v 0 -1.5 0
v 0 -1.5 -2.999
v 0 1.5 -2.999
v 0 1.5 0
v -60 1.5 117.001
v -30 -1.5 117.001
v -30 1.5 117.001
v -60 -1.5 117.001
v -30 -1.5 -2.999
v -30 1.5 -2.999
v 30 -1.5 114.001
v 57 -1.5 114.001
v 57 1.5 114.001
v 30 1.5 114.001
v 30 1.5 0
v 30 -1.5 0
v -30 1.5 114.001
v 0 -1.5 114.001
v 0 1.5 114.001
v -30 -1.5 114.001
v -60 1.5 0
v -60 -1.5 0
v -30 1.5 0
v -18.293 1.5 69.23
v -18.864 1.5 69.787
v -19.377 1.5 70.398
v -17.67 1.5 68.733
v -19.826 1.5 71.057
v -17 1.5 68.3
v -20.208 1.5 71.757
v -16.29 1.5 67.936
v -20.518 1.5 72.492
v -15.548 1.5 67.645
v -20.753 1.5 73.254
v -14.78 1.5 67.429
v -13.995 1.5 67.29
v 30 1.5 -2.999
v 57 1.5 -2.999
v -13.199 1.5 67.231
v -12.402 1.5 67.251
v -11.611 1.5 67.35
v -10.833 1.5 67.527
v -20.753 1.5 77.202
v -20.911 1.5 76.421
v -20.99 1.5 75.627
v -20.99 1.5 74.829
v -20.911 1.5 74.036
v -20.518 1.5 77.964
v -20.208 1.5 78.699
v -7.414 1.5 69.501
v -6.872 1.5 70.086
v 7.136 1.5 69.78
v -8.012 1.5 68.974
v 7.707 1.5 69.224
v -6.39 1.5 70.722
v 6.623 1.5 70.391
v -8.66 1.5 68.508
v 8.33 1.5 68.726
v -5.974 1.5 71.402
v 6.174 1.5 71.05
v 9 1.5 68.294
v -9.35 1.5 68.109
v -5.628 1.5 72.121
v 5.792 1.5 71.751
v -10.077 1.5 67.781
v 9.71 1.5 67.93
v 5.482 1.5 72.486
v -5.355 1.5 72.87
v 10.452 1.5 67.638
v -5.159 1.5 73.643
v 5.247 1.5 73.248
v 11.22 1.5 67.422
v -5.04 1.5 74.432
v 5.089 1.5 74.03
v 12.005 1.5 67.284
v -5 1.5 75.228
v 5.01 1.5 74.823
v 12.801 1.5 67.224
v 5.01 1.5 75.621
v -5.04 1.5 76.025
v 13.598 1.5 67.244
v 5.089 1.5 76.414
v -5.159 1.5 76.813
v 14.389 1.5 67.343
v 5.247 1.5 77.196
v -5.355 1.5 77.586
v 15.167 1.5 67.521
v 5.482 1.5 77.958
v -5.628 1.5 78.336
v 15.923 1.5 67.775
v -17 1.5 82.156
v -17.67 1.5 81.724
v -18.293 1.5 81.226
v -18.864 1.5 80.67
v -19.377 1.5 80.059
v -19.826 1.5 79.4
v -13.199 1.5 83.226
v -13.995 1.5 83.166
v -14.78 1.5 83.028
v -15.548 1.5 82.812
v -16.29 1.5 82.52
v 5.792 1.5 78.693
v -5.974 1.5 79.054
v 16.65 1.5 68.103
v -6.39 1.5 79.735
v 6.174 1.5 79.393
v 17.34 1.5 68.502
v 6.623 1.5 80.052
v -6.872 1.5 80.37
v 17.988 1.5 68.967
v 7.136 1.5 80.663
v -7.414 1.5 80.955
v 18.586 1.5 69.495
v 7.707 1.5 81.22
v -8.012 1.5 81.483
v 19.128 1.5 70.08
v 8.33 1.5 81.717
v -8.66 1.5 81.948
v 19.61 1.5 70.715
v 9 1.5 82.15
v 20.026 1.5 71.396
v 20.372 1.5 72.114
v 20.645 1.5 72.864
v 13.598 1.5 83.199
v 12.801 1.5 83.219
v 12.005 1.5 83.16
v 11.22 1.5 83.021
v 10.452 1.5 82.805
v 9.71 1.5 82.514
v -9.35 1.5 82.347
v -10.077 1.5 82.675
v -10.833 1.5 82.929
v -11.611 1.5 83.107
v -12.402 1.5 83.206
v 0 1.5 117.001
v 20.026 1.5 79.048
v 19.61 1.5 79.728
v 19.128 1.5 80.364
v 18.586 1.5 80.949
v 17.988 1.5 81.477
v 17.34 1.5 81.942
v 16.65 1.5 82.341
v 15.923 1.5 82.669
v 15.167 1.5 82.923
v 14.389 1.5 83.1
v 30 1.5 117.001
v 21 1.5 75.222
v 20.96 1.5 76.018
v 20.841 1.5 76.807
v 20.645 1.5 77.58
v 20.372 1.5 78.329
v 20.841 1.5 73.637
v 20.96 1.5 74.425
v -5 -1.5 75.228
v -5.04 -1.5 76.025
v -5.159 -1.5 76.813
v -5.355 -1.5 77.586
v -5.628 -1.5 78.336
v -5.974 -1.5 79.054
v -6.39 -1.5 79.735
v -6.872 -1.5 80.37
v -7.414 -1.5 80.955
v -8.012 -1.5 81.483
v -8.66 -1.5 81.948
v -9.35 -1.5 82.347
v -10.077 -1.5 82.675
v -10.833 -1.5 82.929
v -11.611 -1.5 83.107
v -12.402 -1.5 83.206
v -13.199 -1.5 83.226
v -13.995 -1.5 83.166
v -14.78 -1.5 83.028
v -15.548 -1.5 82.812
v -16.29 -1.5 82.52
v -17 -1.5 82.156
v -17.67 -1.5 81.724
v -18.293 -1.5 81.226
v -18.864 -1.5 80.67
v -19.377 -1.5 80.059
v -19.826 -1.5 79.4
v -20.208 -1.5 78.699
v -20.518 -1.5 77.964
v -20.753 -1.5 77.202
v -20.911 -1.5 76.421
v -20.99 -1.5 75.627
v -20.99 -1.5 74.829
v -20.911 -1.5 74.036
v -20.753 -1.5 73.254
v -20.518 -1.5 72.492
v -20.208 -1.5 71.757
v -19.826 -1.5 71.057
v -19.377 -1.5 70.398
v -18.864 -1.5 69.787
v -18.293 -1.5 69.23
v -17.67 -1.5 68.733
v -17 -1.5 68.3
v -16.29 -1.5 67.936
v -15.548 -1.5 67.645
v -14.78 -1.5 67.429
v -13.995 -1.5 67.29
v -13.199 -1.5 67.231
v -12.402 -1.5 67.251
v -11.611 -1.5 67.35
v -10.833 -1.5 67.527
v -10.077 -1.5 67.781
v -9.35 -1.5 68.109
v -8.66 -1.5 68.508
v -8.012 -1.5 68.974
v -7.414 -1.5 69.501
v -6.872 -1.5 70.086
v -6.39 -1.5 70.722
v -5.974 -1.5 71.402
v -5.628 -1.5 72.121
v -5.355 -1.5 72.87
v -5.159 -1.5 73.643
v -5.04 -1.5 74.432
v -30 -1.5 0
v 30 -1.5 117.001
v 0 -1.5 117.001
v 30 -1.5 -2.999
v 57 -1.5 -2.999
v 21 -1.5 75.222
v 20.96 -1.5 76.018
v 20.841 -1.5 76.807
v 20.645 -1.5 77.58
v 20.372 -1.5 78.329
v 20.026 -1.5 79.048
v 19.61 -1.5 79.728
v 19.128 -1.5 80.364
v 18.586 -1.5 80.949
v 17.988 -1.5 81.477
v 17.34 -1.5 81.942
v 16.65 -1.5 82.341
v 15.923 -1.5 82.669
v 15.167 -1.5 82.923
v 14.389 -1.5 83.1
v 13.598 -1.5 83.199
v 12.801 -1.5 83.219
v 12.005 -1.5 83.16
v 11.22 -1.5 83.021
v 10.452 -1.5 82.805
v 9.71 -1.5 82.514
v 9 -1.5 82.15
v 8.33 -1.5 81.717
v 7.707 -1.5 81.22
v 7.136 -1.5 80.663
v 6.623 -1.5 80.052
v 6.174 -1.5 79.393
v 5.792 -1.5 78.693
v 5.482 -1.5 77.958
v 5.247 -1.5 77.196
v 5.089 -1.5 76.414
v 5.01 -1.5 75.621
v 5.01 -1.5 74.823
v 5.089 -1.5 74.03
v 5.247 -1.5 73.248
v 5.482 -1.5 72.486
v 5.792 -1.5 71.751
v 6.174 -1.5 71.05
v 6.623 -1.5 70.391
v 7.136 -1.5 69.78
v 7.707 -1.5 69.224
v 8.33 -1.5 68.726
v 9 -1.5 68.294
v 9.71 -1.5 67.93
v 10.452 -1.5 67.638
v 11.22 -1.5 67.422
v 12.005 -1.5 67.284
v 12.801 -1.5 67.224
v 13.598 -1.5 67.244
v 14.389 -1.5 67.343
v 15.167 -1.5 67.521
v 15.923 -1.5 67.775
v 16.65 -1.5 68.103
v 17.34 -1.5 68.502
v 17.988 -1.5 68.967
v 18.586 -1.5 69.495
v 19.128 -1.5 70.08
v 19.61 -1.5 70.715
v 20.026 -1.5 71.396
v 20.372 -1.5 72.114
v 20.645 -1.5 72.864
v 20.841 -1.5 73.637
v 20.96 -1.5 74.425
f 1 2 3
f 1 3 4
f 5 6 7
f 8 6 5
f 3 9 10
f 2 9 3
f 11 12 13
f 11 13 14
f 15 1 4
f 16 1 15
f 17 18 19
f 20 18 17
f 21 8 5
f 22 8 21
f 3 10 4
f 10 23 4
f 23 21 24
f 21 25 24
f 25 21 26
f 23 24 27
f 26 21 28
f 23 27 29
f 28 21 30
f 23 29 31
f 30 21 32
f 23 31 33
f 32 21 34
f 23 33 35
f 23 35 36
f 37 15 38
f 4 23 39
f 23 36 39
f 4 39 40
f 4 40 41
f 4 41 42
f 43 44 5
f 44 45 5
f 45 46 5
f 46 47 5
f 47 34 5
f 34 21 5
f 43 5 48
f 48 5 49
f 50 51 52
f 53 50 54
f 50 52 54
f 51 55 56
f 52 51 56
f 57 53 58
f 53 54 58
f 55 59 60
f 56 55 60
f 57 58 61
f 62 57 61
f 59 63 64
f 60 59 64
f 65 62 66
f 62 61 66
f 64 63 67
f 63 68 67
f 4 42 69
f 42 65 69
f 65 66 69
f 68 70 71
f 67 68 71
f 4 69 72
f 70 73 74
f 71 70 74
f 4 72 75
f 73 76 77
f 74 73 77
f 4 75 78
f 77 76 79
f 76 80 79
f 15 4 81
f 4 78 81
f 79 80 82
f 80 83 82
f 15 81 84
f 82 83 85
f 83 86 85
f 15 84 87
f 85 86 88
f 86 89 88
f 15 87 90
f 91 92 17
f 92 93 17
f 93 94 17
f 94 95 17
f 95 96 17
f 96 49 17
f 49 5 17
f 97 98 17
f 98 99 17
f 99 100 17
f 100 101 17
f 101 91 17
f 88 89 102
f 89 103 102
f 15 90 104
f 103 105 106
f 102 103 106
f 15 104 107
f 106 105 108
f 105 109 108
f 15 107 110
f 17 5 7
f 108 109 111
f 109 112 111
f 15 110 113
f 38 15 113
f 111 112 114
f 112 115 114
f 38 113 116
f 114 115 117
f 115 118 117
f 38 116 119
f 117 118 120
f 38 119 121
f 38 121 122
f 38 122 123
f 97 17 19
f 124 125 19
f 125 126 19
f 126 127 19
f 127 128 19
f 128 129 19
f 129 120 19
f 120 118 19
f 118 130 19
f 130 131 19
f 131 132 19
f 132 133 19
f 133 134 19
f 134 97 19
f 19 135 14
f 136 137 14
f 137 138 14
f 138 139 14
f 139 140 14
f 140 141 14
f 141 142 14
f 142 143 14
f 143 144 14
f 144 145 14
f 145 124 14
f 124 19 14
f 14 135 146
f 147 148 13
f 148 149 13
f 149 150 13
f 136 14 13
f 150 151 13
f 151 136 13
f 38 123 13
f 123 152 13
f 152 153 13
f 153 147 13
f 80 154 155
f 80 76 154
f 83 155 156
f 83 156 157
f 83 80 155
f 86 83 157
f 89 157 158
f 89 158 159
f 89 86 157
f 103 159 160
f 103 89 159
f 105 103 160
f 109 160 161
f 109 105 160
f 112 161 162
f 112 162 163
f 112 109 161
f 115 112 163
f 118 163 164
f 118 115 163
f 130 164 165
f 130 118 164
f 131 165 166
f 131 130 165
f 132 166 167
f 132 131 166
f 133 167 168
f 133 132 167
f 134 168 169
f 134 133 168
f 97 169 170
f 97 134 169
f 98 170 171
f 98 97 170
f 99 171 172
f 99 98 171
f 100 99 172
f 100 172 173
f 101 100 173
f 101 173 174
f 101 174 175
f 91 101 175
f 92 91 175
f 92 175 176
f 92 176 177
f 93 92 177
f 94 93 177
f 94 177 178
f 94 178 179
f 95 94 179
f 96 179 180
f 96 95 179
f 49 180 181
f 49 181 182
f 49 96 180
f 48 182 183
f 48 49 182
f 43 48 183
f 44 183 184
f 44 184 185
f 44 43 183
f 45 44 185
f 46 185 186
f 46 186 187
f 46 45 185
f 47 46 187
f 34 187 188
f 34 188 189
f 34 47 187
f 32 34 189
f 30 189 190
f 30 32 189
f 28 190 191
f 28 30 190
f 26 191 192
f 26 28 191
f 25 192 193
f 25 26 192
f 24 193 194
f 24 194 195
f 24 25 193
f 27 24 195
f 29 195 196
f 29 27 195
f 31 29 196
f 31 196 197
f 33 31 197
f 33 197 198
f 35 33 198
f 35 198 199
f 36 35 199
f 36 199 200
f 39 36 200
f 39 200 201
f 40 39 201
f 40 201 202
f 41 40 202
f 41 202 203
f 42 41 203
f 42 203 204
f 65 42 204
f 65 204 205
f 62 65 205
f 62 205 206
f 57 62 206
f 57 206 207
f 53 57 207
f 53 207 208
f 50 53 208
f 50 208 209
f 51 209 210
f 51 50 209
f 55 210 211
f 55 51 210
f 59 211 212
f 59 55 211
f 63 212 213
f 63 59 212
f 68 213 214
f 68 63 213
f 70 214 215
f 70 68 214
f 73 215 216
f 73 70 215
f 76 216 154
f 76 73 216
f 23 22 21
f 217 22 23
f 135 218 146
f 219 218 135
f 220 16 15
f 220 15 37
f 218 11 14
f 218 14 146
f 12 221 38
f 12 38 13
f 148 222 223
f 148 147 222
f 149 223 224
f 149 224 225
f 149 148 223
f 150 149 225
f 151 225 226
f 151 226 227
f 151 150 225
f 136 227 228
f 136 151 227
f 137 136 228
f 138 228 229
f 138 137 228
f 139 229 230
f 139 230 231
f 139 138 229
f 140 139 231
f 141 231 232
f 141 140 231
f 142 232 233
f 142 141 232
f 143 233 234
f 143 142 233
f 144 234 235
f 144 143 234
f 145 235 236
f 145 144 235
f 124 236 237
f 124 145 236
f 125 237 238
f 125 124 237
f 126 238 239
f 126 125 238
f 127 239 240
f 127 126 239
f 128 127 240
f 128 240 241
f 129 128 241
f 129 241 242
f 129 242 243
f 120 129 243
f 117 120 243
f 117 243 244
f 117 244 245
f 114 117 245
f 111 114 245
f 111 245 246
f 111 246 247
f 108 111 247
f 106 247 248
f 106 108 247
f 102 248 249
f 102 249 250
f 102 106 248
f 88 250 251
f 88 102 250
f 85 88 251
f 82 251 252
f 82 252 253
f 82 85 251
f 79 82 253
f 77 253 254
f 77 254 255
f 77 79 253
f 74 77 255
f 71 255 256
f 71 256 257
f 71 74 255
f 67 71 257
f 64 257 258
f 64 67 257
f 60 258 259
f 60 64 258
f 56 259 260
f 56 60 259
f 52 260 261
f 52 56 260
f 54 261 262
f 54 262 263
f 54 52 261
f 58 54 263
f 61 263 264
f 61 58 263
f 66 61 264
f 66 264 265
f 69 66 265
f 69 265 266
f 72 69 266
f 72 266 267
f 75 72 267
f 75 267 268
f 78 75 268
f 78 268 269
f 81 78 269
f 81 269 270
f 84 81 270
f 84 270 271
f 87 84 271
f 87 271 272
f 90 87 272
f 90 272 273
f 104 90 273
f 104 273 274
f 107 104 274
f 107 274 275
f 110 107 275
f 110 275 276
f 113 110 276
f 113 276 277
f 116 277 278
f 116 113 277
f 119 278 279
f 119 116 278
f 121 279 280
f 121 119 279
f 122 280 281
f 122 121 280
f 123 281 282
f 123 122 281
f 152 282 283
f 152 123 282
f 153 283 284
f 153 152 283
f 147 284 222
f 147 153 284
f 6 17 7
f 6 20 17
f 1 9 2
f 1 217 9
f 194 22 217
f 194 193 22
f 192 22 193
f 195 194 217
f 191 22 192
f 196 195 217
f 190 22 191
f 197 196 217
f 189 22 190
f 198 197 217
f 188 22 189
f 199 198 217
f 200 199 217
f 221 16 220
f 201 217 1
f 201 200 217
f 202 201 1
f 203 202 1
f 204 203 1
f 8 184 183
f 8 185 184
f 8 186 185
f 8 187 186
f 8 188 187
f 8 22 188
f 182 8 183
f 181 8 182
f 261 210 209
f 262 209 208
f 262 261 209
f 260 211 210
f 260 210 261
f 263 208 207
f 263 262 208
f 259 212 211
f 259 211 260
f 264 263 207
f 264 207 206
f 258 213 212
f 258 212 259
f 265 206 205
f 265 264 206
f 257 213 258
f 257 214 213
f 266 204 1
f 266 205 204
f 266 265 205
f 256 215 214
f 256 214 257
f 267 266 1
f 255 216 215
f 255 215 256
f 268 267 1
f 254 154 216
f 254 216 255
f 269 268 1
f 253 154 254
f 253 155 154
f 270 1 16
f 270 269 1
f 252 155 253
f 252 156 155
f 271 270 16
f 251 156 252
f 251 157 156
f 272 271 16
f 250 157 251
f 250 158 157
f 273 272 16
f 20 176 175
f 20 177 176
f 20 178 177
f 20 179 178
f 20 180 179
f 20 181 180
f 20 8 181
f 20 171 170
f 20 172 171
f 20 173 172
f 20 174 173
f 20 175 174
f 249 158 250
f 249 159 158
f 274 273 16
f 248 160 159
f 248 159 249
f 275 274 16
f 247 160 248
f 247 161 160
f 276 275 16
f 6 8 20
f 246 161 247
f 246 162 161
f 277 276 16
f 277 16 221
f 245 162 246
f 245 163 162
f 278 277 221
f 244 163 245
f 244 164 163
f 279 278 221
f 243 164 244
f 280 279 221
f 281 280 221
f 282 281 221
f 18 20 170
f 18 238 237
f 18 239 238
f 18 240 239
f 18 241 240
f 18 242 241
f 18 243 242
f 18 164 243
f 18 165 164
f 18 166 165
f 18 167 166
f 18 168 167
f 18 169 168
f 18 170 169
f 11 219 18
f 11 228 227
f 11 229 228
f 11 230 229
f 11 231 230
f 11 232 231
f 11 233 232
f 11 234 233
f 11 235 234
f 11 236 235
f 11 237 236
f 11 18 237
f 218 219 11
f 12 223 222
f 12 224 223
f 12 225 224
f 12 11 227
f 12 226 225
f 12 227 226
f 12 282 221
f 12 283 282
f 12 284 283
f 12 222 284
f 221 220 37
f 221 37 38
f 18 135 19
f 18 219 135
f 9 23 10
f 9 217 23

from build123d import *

# Parameters (mm, degrees)
F0_R     = 8
F1_DEPTH = 1.5


# Not quite as in the source:
# - a feature names something its author has since deleted; it is built from what else it names


with BuildPart() as f1:
    # F0 (on Front) → F1 (new body, symmetric)
    with BuildSketch(Plane.XZ):
        Polygon((-30, -2.9994321861), (0, -2.9994321861), (0, 0), (30, 0), (30, -2.9994321861), (57, -2.9994321861), (57, 114.0005678139), (30, 114.0005678139), (30, 117.0005678139), (0, 117.0005678139), (0, 114.0005678139), (-30, 114.0005678139), (-30, 117.0005678139), (-60, 117.0005678139), (-60, 0), (-30, 0), align=None)
        with Locations((-13, 75.2281695604)):
            Circle(F0_R, mode=Mode.SUBTRACT)
        with Locations((13, 75.2218647463)):
            Circle(F0_R, mode=Mode.SUBTRACT)
    extrude(amount=F1_DEPTH, both=True)


solid = f1.part
